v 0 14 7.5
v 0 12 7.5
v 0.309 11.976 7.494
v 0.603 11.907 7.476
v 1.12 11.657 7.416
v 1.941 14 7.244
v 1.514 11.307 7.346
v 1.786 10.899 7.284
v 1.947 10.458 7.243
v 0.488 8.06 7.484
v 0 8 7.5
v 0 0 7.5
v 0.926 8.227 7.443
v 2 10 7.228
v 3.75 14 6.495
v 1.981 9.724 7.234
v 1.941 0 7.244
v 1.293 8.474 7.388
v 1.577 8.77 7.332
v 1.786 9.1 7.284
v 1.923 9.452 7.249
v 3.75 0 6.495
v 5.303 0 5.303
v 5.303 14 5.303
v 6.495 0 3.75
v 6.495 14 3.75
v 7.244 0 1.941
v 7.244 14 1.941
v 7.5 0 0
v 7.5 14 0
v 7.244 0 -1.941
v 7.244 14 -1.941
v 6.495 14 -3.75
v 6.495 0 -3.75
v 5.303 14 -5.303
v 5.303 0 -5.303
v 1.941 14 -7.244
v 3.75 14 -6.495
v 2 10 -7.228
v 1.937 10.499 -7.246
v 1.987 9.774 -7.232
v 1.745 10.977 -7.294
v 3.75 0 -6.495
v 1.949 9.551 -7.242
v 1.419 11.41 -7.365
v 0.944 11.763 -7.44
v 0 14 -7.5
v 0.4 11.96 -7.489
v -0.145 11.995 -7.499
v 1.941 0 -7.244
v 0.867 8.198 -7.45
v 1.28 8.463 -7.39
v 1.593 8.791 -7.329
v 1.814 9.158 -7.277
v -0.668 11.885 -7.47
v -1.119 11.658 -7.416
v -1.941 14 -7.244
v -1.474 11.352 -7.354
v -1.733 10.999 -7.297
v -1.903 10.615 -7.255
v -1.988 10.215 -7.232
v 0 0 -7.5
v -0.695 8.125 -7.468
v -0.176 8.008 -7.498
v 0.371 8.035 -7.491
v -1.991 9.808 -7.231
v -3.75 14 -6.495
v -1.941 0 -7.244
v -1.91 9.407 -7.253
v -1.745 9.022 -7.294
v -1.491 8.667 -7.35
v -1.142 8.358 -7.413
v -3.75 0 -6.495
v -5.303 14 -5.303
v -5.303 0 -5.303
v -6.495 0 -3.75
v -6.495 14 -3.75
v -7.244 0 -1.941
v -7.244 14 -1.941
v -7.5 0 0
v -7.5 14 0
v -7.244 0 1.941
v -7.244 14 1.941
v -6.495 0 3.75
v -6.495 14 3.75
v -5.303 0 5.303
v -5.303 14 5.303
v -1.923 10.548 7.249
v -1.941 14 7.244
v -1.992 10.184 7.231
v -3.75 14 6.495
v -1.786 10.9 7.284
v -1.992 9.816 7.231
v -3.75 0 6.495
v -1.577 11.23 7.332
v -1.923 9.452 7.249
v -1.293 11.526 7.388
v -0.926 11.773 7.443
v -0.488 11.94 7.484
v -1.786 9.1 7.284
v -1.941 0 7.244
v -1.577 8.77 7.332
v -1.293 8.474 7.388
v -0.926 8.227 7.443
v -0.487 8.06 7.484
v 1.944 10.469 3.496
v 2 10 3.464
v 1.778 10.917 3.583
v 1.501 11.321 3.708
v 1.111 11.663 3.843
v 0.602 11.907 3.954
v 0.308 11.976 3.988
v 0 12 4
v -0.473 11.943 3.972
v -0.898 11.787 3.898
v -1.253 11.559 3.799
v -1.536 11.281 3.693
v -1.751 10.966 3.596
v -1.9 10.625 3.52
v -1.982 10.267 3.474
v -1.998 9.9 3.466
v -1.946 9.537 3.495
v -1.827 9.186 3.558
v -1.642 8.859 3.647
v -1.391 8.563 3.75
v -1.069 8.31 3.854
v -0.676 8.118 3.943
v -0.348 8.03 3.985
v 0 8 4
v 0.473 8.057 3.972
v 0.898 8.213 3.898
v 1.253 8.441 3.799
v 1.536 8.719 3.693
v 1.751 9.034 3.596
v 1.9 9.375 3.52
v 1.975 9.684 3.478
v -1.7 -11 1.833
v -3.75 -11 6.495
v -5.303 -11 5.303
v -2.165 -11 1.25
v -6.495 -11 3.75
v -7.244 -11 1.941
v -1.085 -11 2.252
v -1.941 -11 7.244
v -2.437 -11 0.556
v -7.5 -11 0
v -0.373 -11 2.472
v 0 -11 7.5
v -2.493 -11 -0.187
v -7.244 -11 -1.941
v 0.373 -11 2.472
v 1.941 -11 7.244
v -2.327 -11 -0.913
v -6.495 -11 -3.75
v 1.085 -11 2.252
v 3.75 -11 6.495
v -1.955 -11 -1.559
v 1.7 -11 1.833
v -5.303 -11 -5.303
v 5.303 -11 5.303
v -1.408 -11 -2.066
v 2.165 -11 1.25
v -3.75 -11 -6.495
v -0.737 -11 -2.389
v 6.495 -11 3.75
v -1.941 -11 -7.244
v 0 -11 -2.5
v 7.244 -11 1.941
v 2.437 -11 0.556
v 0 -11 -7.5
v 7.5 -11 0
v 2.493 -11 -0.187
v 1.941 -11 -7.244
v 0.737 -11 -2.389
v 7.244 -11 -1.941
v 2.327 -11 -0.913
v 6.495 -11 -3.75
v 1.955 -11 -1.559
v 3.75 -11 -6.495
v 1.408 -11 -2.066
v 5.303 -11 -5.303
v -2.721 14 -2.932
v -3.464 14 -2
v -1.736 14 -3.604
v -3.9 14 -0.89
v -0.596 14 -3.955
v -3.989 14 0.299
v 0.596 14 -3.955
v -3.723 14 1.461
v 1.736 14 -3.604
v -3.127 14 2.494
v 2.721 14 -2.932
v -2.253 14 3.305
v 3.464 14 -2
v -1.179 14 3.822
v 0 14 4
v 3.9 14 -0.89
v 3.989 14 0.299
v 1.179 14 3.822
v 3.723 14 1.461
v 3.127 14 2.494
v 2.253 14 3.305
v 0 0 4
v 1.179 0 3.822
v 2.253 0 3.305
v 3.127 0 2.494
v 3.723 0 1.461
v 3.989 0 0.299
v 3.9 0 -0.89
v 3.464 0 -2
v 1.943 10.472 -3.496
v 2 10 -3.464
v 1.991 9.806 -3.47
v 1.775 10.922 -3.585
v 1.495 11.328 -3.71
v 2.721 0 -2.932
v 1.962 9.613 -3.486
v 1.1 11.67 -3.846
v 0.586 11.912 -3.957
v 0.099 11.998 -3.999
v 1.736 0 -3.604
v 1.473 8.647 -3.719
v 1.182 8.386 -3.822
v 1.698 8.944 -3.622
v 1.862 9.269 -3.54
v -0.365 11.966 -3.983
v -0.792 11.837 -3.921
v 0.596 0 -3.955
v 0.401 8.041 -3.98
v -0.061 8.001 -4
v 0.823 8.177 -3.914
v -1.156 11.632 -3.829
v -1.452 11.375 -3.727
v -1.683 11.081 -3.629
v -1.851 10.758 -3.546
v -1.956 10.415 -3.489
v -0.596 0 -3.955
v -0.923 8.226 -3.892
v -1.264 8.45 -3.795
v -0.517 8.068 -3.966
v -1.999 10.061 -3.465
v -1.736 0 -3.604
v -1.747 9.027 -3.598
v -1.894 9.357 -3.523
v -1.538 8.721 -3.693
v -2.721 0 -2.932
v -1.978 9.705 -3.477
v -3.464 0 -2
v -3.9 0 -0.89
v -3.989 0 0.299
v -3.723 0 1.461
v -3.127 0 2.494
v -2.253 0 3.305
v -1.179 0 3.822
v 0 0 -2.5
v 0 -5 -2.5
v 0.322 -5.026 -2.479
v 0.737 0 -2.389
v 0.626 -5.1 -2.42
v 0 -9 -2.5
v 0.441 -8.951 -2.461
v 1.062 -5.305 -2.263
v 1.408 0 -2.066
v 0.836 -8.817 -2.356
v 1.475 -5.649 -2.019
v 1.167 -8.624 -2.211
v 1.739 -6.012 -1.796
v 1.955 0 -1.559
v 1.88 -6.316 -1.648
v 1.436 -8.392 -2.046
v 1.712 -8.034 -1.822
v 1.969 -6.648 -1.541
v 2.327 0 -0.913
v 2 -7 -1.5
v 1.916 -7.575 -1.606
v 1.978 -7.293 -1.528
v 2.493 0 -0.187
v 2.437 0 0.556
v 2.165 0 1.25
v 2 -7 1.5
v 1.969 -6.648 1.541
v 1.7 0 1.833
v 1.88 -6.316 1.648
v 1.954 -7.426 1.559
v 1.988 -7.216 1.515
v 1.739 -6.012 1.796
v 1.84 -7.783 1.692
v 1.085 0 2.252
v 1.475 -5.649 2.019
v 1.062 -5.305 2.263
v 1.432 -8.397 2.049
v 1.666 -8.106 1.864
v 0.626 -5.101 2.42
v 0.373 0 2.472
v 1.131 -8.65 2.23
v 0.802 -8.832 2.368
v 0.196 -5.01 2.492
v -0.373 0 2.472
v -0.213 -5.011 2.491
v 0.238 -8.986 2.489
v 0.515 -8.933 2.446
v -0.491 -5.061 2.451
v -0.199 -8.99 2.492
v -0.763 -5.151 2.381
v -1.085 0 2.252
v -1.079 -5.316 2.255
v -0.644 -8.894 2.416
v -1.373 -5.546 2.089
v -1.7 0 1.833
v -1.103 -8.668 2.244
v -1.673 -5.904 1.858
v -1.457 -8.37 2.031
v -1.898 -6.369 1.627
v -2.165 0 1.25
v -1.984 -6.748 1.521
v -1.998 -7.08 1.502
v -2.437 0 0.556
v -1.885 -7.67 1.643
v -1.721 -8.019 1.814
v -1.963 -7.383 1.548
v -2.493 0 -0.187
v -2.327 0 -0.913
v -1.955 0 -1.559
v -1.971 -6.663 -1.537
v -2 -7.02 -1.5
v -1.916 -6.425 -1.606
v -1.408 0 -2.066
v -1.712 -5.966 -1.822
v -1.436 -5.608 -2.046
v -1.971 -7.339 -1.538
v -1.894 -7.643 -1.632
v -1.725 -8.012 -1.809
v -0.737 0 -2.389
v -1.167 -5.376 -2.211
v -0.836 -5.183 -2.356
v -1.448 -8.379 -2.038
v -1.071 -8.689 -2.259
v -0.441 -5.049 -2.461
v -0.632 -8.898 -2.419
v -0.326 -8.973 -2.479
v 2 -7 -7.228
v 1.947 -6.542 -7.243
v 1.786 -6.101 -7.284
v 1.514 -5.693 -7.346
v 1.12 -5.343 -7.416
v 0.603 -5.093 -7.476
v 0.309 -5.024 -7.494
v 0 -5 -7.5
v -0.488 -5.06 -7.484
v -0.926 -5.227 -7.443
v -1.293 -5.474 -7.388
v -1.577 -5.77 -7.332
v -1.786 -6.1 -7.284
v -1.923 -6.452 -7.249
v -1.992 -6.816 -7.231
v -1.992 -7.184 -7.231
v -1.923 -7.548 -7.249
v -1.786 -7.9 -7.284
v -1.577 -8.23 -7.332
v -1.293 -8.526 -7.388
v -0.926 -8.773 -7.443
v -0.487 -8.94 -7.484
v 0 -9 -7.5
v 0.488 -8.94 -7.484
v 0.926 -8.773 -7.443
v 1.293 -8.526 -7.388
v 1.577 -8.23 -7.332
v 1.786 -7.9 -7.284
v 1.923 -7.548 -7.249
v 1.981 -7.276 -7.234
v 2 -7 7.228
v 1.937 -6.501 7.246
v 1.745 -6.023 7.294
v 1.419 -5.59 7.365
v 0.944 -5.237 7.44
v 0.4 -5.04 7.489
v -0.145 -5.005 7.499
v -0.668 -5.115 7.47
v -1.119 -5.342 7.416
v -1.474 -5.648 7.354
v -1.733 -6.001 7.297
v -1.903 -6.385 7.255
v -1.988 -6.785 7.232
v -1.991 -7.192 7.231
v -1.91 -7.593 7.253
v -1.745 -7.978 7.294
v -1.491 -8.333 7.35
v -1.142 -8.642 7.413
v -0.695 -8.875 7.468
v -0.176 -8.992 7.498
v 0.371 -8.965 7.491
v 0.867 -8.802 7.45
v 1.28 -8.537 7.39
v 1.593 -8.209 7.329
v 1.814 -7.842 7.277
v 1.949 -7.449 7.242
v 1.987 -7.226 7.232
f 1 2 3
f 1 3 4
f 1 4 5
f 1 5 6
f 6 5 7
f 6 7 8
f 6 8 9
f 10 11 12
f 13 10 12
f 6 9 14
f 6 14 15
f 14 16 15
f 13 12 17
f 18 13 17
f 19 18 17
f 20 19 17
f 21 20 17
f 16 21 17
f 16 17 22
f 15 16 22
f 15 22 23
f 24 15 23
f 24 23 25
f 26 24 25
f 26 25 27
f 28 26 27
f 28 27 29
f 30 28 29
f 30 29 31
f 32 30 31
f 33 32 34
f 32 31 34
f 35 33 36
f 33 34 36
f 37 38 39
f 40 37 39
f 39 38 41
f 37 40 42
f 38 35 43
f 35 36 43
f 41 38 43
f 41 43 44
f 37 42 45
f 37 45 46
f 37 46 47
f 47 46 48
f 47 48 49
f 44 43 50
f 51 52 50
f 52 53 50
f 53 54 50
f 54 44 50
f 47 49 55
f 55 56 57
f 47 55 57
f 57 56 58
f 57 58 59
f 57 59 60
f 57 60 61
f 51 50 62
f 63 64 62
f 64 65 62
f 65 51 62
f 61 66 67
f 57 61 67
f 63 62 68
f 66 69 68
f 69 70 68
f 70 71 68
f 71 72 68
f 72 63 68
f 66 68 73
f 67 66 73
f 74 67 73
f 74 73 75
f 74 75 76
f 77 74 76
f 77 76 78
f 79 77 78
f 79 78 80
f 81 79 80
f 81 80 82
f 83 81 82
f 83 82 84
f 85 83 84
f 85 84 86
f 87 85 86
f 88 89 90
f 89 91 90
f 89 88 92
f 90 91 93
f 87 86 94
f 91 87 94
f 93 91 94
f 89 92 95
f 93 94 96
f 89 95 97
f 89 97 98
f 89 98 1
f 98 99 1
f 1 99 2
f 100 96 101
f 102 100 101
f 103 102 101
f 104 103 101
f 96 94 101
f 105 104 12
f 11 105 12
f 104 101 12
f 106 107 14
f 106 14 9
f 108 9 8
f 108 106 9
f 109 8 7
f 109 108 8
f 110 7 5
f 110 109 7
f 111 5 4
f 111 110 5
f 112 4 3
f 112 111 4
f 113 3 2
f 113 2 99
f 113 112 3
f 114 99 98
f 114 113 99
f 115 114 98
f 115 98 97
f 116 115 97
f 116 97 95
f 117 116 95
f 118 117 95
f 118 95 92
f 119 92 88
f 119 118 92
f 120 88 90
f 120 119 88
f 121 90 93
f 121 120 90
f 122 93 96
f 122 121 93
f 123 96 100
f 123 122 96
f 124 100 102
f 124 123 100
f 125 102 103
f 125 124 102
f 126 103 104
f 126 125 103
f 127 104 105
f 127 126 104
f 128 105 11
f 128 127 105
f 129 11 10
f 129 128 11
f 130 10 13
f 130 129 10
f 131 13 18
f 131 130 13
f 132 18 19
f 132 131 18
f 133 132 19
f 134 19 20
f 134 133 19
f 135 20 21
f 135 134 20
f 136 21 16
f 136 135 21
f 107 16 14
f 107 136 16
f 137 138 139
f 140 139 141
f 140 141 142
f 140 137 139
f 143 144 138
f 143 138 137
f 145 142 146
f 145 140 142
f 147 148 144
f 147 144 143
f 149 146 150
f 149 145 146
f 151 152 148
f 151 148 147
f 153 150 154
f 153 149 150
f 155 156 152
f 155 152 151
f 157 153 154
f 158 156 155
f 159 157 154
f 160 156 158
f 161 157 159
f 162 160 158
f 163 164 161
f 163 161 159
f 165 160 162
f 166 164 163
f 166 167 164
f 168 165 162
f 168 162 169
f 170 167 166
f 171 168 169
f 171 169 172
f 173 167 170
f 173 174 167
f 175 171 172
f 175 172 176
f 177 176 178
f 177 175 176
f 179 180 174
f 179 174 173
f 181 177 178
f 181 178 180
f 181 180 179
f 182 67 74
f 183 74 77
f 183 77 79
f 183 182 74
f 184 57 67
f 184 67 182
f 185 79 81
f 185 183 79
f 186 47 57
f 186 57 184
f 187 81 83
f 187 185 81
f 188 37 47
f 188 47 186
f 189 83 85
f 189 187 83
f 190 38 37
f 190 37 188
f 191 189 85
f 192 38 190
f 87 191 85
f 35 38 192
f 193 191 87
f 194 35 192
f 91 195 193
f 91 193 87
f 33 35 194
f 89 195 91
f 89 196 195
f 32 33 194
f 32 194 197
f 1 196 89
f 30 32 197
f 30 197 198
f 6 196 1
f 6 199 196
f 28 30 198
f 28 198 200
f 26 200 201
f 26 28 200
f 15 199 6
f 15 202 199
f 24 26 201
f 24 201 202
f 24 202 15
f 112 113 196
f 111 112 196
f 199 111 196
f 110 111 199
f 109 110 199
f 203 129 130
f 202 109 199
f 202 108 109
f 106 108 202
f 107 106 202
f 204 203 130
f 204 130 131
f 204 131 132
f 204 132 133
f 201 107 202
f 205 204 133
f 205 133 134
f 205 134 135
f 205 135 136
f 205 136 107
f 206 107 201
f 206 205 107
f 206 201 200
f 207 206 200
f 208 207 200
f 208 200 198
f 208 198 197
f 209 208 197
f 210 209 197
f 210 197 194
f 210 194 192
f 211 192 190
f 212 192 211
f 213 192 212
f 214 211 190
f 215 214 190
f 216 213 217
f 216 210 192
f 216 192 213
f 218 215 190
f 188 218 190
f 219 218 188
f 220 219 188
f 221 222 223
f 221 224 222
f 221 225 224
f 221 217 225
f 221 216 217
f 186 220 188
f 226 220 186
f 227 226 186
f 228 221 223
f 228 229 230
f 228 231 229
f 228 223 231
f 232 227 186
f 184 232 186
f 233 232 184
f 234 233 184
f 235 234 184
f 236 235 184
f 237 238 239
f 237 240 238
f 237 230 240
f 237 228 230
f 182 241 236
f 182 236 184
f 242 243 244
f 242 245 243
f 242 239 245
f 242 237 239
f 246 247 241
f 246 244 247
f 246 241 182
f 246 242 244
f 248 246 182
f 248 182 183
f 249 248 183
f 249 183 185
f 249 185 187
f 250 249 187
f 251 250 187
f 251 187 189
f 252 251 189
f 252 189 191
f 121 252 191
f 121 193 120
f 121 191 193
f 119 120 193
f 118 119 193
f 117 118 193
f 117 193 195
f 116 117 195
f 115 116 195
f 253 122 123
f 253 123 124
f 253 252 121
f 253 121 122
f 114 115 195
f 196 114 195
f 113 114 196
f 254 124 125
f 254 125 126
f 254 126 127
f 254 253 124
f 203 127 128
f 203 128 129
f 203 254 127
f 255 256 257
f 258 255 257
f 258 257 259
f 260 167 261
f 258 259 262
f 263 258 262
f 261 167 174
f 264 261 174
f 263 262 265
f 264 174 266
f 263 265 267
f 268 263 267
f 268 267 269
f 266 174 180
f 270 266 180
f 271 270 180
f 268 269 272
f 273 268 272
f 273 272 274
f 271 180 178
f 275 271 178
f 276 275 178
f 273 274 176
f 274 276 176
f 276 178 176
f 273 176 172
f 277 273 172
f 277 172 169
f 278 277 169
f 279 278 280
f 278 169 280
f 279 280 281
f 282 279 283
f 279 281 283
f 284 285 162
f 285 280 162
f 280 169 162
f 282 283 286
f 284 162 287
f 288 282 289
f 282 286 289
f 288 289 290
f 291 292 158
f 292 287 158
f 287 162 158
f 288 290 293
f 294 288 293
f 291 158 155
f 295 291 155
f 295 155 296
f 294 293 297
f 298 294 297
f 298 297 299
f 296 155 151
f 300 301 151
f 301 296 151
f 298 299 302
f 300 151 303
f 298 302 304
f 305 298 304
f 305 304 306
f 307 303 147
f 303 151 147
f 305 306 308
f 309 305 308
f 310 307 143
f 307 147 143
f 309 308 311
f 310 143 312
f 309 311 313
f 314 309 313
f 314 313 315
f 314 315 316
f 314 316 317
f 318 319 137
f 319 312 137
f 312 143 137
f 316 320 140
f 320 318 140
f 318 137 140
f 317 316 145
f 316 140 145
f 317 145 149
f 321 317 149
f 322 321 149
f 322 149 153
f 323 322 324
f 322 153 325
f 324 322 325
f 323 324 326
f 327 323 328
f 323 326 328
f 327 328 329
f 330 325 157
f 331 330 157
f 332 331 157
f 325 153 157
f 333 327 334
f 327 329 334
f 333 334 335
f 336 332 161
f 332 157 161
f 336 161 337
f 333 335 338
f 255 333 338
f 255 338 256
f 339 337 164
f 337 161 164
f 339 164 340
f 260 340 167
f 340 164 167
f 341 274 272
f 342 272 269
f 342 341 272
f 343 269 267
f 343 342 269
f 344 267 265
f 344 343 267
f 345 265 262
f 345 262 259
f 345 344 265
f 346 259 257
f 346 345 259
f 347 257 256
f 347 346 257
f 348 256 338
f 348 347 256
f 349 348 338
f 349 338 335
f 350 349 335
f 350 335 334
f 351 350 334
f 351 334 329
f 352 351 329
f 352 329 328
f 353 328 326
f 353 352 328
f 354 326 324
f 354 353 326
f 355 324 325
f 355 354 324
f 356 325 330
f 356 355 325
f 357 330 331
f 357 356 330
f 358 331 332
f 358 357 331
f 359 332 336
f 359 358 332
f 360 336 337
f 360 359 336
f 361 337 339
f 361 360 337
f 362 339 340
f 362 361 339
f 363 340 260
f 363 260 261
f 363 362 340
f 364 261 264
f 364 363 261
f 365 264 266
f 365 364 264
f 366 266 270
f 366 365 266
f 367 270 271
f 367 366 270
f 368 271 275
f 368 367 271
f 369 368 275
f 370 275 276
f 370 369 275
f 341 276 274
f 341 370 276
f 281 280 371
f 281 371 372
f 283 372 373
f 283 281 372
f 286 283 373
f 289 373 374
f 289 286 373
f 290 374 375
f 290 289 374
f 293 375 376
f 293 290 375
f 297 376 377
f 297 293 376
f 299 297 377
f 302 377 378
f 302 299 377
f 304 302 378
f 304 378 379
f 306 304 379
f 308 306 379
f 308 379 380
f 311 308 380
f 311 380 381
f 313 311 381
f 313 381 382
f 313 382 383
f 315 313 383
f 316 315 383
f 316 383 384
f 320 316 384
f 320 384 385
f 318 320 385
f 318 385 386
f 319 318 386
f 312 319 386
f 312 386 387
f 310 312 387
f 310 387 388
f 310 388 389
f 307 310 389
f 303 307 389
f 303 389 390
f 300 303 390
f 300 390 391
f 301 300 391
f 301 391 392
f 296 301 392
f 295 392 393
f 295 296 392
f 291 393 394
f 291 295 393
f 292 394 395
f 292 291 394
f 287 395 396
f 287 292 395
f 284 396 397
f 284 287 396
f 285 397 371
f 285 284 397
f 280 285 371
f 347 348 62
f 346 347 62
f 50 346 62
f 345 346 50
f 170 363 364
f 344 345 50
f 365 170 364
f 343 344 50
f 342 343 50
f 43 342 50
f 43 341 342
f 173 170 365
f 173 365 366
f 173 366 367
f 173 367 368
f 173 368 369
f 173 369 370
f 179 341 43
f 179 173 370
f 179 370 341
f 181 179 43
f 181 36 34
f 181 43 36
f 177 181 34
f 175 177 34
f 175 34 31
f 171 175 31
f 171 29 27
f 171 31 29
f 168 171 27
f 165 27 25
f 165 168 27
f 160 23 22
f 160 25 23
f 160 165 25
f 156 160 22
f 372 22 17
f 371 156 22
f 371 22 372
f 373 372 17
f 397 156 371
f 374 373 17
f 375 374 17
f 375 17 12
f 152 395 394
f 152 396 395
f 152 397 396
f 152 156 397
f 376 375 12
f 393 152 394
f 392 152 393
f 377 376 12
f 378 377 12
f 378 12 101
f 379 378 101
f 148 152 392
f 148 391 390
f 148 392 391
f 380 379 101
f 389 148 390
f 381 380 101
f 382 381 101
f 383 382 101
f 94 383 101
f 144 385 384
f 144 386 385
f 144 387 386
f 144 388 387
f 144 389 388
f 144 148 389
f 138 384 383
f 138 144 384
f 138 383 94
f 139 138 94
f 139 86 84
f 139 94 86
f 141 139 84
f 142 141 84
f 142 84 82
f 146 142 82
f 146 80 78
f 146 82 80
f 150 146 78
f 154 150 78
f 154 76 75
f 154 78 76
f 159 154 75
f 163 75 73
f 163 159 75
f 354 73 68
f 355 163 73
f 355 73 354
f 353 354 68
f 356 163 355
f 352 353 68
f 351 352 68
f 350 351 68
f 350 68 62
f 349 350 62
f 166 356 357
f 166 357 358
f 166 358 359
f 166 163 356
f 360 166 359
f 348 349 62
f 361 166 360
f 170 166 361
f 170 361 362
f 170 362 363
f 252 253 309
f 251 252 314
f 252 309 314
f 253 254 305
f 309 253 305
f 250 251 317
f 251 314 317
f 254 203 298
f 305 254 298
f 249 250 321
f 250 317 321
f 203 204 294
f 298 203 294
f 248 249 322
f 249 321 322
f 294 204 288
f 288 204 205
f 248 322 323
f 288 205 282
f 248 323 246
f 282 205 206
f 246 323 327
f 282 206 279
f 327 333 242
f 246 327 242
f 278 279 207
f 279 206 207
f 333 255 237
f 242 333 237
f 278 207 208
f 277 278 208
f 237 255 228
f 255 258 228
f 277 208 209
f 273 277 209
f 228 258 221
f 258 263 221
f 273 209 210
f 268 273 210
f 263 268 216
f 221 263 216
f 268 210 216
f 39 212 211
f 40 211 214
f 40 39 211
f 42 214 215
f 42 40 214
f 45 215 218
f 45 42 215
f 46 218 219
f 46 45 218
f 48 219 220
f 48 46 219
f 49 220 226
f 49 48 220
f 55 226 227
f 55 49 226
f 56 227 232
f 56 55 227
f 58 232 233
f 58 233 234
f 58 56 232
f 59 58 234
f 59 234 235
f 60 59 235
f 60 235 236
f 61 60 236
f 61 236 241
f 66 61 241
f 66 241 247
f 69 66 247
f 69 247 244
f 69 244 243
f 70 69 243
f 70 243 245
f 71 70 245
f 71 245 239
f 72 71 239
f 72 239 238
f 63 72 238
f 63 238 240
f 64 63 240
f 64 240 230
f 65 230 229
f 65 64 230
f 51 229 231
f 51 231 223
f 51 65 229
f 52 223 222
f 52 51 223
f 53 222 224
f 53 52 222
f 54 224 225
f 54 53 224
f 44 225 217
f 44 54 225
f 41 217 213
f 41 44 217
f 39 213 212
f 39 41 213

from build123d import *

# Parameters (mm, degrees)
SKETCH1_R               = 7.5
SKETCH1_R_2             = 4
BOSS_EXTRUDE1_DEPTH     = 14
BOSS_EXTRUDE2_START     = 11
SKETCH2_R               = 7.5
SKETCH2_R_2             = 2.5
BOSS_EXTRUDE2_DEPTH     = 11
CUT_EXTRUDE1_DEPTH      = 18.56416807
CUT_EXTRUDE1_DEPTH_BACK = 18.56416807
SKETCH3_R               = 2


with BuildPart() as part:
    # Sketch1 → Boss-Extrude1 (new body)
    with BuildSketch(Plane(origin=(0, 0, 0), x_dir=(1, 0, 0), z_dir=(0, 1, 0))):
        with Locations(Location((0, 0, 0), (0, 0, 270))):
            Circle(SKETCH1_R)
        with Locations(Location((0, 0, 0), (0, 0, 270))):
            Circle(SKETCH1_R_2, mode=Mode.SUBTRACT)
    extrude(amount=BOSS_EXTRUDE1_DEPTH)

    # Sketch2 → Boss-Extrude2 (add)
    with BuildSketch(Plane.XZ.offset(BOSS_EXTRUDE2_START)):
        with Locations(Location((0, 0, 0), (0, 0, 270))):
            Circle(SKETCH2_R)
        with Locations(Location((0, 0, 0), (0, 0, 270))):
            Circle(SKETCH2_R_2, mode=Mode.SUBTRACT)
    extrude(amount=-BOSS_EXTRUDE2_DEPTH)

    # Sketch3 → Cut-Extrude1 (cut, two sides: drawn at the far end of the back side and taken through both)
    with BuildSketch(Plane.XY.offset(-CUT_EXTRUDE1_DEPTH_BACK)):
        with Locations((0, 10)):
            Circle(SKETCH3_R)
        with Locations((0, -7)):
            Circle(SKETCH3_R)
    extrude(amount=CUT_EXTRUDE1_DEPTH + CUT_EXTRUDE1_DEPTH_BACK, mode=Mode.SUBTRACT)


solid = part.part
